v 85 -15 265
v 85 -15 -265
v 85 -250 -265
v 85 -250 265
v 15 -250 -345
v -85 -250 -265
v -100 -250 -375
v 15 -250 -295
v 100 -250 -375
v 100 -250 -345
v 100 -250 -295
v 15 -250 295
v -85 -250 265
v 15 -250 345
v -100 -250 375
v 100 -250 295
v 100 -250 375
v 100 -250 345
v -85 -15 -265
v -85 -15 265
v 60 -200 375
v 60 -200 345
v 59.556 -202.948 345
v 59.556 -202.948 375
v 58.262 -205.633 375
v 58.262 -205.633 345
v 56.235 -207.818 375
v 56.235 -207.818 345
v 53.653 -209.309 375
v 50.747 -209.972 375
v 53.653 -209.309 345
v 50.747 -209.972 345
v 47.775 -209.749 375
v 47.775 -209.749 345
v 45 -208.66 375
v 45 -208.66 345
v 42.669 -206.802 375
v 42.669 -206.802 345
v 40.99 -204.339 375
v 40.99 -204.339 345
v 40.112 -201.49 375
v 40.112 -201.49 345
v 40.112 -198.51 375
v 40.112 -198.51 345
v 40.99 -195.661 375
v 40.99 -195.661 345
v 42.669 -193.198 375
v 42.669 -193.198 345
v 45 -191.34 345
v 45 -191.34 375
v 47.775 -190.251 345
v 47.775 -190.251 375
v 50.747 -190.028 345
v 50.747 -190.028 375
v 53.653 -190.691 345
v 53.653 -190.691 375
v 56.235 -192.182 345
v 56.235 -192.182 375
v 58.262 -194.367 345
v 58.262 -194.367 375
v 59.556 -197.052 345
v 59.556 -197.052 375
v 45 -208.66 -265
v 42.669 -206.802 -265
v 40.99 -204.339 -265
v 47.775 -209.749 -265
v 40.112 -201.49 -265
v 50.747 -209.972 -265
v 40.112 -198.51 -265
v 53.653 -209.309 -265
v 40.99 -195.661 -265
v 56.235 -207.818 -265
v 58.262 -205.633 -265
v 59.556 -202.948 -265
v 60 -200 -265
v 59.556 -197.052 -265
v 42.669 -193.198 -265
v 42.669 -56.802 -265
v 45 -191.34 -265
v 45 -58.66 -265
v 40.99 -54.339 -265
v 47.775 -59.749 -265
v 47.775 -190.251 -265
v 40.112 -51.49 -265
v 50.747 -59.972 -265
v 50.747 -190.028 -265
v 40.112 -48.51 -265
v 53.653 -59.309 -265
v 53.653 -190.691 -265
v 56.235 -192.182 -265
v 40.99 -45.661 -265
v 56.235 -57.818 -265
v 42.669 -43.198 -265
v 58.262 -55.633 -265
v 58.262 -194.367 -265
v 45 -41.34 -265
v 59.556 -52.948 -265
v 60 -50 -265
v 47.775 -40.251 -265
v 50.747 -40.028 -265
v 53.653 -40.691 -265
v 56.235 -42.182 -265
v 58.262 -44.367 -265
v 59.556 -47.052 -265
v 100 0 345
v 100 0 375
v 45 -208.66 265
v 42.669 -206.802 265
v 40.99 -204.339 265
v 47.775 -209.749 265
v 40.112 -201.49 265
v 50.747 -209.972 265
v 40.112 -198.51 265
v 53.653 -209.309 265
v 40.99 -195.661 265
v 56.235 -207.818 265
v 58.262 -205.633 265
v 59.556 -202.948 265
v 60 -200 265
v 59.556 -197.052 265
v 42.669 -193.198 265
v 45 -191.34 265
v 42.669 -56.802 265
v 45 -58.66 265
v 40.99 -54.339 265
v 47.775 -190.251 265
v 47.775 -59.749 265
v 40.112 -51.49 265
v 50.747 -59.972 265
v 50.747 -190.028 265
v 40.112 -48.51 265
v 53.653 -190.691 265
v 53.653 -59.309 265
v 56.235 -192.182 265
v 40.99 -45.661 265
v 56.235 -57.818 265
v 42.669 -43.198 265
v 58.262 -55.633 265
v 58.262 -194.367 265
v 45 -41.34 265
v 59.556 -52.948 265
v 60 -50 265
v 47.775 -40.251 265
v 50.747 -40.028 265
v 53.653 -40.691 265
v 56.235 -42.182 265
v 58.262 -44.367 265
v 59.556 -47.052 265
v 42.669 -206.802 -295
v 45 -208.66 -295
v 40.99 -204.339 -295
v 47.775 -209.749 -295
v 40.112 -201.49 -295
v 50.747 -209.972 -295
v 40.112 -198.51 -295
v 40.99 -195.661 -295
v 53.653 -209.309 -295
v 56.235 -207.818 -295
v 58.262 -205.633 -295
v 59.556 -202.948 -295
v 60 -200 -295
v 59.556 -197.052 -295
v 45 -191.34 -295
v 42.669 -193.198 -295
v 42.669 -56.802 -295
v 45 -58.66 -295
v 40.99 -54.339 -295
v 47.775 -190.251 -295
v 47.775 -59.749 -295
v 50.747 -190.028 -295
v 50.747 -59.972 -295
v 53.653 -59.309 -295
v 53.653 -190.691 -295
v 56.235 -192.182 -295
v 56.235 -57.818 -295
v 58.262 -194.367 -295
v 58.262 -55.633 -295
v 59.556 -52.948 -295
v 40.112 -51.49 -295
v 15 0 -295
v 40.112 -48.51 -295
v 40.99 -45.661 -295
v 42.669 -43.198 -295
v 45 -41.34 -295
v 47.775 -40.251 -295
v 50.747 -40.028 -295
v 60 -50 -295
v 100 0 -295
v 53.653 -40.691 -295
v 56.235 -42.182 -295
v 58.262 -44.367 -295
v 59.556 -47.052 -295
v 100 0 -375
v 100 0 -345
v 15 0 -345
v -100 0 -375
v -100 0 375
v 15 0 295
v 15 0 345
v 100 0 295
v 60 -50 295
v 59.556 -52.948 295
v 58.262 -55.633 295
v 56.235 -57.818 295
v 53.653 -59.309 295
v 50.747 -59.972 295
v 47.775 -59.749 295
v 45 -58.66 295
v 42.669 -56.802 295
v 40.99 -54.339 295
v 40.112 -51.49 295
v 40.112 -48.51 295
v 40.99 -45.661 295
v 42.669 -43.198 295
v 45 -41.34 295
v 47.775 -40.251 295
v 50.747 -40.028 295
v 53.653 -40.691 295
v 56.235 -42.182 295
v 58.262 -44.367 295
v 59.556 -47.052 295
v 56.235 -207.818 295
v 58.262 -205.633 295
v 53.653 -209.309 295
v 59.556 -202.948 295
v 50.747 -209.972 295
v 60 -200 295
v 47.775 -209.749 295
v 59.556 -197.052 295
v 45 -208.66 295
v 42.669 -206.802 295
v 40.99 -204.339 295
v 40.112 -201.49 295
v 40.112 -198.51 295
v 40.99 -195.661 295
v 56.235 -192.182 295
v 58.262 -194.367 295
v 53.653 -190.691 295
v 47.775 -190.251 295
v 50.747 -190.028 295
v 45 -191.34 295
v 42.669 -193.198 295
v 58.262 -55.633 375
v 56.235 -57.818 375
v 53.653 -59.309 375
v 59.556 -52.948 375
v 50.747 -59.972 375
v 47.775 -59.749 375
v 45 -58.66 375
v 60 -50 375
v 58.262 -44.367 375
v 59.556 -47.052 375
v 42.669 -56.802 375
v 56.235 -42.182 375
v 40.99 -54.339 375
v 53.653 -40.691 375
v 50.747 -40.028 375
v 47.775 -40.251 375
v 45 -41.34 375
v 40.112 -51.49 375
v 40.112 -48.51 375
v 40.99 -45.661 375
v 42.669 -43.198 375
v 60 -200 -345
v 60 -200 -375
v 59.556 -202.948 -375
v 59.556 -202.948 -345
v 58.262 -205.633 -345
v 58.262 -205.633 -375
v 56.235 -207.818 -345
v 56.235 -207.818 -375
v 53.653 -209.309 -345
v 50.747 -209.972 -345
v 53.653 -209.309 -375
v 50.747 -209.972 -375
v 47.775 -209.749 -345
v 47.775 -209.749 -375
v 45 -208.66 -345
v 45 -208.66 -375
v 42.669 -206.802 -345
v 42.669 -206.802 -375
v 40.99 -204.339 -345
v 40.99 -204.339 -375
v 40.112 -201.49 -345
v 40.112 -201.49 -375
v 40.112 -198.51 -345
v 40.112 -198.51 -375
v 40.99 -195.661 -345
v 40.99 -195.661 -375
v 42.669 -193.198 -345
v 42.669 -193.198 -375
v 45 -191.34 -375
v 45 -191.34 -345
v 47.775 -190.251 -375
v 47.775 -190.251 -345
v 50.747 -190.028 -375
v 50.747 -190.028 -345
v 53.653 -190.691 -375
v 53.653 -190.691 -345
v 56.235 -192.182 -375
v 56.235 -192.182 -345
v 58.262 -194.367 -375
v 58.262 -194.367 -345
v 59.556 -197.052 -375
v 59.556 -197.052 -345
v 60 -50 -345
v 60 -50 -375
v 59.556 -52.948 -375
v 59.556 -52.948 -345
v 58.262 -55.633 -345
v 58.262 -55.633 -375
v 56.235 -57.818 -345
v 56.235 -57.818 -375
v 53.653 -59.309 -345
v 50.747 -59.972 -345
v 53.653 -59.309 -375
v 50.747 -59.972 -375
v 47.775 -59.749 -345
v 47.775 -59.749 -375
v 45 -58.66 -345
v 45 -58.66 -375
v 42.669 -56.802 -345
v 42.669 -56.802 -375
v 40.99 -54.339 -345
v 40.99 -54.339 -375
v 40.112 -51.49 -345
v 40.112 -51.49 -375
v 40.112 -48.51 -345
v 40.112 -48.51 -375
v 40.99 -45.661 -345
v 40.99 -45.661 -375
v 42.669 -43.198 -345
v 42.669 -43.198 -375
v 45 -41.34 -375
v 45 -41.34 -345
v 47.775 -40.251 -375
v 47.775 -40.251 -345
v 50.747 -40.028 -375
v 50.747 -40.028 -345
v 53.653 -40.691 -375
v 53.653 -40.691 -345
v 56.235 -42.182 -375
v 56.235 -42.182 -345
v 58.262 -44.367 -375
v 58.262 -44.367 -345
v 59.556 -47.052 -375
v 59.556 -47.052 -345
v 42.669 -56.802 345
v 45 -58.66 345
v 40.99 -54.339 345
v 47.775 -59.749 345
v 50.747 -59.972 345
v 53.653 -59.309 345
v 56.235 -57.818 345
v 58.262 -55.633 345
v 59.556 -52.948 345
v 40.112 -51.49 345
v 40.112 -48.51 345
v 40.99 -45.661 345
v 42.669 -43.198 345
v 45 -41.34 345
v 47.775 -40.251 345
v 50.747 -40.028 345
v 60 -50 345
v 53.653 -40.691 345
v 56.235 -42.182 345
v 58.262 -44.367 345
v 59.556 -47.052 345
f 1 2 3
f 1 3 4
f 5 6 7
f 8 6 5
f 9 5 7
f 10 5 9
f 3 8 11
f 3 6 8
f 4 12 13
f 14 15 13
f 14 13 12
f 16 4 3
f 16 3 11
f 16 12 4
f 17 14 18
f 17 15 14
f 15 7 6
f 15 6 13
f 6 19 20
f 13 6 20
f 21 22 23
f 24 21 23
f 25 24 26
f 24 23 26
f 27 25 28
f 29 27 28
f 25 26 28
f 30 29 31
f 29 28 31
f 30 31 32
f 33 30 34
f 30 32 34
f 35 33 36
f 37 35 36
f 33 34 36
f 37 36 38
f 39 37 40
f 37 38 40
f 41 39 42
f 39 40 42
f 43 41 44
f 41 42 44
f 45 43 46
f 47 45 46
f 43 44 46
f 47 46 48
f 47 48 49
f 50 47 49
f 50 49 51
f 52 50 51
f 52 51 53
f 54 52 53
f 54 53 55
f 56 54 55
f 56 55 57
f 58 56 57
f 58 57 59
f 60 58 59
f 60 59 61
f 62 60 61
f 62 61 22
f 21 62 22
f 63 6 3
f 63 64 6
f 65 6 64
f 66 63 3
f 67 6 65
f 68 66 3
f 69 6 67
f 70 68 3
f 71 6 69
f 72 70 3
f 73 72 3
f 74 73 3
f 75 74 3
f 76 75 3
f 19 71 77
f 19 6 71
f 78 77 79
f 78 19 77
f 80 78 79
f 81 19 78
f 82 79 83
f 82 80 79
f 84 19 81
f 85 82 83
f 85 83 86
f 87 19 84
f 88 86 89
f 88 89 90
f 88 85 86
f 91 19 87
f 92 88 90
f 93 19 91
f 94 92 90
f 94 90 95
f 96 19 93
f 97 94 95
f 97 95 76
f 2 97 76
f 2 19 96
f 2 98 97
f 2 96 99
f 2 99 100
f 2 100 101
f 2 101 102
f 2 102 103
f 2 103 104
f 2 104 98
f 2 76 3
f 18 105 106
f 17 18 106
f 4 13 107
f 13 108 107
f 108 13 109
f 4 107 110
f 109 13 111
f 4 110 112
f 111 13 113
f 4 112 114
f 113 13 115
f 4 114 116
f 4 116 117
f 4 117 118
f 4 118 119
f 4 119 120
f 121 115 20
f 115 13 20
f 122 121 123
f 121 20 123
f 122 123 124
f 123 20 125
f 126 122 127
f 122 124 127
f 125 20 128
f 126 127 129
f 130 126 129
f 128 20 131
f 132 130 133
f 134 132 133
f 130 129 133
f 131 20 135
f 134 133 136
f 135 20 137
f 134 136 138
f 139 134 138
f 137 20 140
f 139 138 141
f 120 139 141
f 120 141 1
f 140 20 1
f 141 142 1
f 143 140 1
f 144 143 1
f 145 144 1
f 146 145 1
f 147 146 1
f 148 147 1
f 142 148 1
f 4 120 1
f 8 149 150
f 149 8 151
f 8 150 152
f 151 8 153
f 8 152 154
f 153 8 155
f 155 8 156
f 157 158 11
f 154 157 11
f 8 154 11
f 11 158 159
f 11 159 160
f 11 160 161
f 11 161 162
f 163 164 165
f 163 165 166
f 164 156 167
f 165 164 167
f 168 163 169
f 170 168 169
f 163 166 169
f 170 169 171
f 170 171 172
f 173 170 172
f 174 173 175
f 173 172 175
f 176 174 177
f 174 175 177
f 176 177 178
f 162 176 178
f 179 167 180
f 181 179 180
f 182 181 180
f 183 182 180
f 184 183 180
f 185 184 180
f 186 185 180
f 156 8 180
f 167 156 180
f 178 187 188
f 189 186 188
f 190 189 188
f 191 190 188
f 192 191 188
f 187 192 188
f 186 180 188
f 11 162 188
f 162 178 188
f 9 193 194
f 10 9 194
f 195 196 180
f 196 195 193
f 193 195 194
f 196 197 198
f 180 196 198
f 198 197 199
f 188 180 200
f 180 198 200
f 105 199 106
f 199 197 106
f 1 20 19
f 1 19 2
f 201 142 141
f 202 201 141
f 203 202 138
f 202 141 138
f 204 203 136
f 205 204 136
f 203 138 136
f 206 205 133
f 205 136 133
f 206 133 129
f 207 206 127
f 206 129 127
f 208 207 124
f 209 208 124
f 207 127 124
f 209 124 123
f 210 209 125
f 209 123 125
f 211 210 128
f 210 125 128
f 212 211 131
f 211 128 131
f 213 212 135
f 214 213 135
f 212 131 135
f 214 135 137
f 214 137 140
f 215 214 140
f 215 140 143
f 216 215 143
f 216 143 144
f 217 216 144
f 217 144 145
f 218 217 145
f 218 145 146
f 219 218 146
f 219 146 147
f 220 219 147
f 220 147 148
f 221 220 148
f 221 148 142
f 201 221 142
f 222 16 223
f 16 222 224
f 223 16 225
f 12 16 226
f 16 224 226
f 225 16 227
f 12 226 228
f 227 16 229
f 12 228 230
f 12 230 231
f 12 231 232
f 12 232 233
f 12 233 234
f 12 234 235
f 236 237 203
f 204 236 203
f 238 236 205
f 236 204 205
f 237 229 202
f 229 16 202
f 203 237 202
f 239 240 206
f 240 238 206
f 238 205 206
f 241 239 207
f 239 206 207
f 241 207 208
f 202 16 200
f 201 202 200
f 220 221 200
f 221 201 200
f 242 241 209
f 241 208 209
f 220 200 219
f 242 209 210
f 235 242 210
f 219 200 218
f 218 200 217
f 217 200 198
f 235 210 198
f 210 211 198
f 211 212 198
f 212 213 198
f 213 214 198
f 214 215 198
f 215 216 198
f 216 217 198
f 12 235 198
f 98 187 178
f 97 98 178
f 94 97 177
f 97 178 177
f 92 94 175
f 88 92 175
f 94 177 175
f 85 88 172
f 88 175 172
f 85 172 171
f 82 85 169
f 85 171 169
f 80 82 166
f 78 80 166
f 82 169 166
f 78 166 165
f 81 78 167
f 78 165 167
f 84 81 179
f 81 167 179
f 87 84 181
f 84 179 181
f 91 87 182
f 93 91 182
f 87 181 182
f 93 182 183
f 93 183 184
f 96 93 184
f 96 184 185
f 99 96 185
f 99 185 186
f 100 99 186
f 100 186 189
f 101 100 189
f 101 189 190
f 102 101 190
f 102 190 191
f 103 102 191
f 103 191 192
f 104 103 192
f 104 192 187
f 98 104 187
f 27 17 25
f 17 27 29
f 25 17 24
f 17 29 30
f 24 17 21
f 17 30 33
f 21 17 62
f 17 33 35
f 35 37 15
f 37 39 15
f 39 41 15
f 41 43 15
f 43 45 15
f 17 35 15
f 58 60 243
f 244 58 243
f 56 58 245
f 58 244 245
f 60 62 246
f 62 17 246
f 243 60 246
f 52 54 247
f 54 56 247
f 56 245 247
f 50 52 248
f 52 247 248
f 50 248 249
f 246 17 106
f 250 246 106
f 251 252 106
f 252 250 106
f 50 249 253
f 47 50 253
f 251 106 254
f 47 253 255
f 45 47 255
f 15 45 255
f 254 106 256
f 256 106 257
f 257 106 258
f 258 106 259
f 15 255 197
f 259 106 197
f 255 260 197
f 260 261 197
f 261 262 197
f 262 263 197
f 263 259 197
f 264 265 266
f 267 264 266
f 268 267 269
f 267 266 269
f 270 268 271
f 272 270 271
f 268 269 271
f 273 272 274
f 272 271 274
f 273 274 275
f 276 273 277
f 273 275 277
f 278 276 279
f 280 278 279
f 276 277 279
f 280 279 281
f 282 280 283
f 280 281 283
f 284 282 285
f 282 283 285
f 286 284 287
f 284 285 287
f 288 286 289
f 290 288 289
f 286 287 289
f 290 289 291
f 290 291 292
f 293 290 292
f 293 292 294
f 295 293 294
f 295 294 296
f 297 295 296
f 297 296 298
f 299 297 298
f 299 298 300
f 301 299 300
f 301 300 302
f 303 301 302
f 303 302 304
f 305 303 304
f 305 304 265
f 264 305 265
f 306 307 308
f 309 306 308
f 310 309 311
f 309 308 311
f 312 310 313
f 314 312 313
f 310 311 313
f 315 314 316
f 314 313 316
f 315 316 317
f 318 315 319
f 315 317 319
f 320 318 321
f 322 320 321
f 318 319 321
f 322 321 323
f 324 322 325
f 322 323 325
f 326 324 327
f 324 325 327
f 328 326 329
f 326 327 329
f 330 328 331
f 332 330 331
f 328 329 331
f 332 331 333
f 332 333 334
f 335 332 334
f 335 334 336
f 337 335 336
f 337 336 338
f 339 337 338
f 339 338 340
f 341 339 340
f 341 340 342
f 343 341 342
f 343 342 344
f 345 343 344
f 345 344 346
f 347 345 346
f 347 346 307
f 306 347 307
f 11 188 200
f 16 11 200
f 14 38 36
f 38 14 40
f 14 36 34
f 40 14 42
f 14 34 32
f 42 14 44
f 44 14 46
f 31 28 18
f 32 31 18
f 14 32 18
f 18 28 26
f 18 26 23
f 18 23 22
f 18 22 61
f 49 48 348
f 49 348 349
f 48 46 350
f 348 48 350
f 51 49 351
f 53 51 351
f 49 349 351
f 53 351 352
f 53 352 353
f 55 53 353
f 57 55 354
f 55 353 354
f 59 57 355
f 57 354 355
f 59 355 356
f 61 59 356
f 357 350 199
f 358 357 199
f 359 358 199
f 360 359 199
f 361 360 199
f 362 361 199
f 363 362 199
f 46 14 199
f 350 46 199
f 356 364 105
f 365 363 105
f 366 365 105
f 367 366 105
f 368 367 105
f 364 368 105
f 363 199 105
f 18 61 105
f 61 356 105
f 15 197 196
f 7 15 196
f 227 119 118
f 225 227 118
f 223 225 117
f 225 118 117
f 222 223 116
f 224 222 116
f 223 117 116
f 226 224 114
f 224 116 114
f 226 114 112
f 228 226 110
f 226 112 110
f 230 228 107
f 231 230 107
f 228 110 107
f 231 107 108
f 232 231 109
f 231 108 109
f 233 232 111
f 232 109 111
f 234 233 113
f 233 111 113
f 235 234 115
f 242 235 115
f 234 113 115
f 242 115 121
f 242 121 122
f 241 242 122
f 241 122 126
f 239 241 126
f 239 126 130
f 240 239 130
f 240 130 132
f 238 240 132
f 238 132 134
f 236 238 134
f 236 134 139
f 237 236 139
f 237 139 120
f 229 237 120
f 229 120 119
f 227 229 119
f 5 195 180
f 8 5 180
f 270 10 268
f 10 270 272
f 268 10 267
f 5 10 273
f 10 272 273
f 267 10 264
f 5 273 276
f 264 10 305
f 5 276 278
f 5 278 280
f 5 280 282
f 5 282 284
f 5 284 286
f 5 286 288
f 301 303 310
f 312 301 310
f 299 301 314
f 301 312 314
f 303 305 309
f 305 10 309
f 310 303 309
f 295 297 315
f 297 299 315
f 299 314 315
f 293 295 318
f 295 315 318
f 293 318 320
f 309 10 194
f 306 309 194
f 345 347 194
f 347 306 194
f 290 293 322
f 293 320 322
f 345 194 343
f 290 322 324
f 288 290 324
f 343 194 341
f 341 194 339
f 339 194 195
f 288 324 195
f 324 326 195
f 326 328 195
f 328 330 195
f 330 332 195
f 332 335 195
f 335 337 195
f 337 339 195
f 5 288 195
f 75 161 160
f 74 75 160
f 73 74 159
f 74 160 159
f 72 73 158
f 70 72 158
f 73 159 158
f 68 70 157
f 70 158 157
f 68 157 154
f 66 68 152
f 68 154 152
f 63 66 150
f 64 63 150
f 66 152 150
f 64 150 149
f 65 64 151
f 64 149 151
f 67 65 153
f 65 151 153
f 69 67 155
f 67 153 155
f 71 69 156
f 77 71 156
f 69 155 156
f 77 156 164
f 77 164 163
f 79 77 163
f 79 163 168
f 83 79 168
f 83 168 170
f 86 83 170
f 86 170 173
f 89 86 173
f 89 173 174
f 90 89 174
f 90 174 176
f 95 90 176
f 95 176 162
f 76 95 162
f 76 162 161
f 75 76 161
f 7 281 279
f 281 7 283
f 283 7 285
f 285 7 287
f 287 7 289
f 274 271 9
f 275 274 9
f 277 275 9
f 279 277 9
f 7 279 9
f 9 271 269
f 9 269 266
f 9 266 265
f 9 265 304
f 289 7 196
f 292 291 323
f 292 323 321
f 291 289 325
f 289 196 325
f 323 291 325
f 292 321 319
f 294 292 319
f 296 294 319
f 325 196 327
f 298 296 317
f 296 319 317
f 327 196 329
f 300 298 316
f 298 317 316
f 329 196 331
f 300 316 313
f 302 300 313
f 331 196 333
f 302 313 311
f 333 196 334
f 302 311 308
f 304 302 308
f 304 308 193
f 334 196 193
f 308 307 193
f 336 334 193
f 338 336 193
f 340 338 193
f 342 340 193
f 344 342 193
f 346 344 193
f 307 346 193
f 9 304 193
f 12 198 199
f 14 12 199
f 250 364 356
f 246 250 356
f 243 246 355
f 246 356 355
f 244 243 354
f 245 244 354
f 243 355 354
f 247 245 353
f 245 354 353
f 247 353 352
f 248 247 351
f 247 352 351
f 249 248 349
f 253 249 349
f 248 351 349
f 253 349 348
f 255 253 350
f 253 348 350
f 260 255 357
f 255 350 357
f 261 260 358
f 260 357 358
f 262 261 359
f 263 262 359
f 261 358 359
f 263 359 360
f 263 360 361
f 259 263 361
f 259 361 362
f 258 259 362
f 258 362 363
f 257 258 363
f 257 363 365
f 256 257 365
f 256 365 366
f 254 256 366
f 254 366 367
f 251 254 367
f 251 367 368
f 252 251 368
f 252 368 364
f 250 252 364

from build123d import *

# Parameters (mm, degrees)
F0_W     = 170
F0_H     = 530
F1_DEPTH = 250
F2_DEPTH = 15
F3_R     = 10
F4_DEPTH = 750


with BuildPart() as f1:
    # F0 (on Front) → F1 (new body)
    with BuildSketch(Plane.XZ):
        Polygon((100, 345), (100, 375), (-100, 375), (-100, -375), (100, -375), (100, -345), (15, -345), (15, -295), (100, -295), (100, 295), (15, 295), (15, 345), align=None)
        Rectangle(F0_W, F0_H, mode=Mode.SUBTRACT)
    extrude(amount=F1_DEPTH)

    # F0 (on Front) → F2 (join)
    with BuildSketch(Plane.XZ):
        Rectangle(F0_W, F0_H)
    extrude(amount=F2_DEPTH)

    # F3 (on face) → F4 (cut)
    with BuildSketch(Plane(origin=(0, 0, -375), x_dir=(1, 0, 0), z_dir=(0, 0, -1))):
        with Locations((50, 200)):
            Circle(F3_R)
        with Locations((50, 50)):
            Circle(F3_R)
    extrude(amount=-F4_DEPTH, mode=Mode.SUBTRACT)


solid = f1.part
